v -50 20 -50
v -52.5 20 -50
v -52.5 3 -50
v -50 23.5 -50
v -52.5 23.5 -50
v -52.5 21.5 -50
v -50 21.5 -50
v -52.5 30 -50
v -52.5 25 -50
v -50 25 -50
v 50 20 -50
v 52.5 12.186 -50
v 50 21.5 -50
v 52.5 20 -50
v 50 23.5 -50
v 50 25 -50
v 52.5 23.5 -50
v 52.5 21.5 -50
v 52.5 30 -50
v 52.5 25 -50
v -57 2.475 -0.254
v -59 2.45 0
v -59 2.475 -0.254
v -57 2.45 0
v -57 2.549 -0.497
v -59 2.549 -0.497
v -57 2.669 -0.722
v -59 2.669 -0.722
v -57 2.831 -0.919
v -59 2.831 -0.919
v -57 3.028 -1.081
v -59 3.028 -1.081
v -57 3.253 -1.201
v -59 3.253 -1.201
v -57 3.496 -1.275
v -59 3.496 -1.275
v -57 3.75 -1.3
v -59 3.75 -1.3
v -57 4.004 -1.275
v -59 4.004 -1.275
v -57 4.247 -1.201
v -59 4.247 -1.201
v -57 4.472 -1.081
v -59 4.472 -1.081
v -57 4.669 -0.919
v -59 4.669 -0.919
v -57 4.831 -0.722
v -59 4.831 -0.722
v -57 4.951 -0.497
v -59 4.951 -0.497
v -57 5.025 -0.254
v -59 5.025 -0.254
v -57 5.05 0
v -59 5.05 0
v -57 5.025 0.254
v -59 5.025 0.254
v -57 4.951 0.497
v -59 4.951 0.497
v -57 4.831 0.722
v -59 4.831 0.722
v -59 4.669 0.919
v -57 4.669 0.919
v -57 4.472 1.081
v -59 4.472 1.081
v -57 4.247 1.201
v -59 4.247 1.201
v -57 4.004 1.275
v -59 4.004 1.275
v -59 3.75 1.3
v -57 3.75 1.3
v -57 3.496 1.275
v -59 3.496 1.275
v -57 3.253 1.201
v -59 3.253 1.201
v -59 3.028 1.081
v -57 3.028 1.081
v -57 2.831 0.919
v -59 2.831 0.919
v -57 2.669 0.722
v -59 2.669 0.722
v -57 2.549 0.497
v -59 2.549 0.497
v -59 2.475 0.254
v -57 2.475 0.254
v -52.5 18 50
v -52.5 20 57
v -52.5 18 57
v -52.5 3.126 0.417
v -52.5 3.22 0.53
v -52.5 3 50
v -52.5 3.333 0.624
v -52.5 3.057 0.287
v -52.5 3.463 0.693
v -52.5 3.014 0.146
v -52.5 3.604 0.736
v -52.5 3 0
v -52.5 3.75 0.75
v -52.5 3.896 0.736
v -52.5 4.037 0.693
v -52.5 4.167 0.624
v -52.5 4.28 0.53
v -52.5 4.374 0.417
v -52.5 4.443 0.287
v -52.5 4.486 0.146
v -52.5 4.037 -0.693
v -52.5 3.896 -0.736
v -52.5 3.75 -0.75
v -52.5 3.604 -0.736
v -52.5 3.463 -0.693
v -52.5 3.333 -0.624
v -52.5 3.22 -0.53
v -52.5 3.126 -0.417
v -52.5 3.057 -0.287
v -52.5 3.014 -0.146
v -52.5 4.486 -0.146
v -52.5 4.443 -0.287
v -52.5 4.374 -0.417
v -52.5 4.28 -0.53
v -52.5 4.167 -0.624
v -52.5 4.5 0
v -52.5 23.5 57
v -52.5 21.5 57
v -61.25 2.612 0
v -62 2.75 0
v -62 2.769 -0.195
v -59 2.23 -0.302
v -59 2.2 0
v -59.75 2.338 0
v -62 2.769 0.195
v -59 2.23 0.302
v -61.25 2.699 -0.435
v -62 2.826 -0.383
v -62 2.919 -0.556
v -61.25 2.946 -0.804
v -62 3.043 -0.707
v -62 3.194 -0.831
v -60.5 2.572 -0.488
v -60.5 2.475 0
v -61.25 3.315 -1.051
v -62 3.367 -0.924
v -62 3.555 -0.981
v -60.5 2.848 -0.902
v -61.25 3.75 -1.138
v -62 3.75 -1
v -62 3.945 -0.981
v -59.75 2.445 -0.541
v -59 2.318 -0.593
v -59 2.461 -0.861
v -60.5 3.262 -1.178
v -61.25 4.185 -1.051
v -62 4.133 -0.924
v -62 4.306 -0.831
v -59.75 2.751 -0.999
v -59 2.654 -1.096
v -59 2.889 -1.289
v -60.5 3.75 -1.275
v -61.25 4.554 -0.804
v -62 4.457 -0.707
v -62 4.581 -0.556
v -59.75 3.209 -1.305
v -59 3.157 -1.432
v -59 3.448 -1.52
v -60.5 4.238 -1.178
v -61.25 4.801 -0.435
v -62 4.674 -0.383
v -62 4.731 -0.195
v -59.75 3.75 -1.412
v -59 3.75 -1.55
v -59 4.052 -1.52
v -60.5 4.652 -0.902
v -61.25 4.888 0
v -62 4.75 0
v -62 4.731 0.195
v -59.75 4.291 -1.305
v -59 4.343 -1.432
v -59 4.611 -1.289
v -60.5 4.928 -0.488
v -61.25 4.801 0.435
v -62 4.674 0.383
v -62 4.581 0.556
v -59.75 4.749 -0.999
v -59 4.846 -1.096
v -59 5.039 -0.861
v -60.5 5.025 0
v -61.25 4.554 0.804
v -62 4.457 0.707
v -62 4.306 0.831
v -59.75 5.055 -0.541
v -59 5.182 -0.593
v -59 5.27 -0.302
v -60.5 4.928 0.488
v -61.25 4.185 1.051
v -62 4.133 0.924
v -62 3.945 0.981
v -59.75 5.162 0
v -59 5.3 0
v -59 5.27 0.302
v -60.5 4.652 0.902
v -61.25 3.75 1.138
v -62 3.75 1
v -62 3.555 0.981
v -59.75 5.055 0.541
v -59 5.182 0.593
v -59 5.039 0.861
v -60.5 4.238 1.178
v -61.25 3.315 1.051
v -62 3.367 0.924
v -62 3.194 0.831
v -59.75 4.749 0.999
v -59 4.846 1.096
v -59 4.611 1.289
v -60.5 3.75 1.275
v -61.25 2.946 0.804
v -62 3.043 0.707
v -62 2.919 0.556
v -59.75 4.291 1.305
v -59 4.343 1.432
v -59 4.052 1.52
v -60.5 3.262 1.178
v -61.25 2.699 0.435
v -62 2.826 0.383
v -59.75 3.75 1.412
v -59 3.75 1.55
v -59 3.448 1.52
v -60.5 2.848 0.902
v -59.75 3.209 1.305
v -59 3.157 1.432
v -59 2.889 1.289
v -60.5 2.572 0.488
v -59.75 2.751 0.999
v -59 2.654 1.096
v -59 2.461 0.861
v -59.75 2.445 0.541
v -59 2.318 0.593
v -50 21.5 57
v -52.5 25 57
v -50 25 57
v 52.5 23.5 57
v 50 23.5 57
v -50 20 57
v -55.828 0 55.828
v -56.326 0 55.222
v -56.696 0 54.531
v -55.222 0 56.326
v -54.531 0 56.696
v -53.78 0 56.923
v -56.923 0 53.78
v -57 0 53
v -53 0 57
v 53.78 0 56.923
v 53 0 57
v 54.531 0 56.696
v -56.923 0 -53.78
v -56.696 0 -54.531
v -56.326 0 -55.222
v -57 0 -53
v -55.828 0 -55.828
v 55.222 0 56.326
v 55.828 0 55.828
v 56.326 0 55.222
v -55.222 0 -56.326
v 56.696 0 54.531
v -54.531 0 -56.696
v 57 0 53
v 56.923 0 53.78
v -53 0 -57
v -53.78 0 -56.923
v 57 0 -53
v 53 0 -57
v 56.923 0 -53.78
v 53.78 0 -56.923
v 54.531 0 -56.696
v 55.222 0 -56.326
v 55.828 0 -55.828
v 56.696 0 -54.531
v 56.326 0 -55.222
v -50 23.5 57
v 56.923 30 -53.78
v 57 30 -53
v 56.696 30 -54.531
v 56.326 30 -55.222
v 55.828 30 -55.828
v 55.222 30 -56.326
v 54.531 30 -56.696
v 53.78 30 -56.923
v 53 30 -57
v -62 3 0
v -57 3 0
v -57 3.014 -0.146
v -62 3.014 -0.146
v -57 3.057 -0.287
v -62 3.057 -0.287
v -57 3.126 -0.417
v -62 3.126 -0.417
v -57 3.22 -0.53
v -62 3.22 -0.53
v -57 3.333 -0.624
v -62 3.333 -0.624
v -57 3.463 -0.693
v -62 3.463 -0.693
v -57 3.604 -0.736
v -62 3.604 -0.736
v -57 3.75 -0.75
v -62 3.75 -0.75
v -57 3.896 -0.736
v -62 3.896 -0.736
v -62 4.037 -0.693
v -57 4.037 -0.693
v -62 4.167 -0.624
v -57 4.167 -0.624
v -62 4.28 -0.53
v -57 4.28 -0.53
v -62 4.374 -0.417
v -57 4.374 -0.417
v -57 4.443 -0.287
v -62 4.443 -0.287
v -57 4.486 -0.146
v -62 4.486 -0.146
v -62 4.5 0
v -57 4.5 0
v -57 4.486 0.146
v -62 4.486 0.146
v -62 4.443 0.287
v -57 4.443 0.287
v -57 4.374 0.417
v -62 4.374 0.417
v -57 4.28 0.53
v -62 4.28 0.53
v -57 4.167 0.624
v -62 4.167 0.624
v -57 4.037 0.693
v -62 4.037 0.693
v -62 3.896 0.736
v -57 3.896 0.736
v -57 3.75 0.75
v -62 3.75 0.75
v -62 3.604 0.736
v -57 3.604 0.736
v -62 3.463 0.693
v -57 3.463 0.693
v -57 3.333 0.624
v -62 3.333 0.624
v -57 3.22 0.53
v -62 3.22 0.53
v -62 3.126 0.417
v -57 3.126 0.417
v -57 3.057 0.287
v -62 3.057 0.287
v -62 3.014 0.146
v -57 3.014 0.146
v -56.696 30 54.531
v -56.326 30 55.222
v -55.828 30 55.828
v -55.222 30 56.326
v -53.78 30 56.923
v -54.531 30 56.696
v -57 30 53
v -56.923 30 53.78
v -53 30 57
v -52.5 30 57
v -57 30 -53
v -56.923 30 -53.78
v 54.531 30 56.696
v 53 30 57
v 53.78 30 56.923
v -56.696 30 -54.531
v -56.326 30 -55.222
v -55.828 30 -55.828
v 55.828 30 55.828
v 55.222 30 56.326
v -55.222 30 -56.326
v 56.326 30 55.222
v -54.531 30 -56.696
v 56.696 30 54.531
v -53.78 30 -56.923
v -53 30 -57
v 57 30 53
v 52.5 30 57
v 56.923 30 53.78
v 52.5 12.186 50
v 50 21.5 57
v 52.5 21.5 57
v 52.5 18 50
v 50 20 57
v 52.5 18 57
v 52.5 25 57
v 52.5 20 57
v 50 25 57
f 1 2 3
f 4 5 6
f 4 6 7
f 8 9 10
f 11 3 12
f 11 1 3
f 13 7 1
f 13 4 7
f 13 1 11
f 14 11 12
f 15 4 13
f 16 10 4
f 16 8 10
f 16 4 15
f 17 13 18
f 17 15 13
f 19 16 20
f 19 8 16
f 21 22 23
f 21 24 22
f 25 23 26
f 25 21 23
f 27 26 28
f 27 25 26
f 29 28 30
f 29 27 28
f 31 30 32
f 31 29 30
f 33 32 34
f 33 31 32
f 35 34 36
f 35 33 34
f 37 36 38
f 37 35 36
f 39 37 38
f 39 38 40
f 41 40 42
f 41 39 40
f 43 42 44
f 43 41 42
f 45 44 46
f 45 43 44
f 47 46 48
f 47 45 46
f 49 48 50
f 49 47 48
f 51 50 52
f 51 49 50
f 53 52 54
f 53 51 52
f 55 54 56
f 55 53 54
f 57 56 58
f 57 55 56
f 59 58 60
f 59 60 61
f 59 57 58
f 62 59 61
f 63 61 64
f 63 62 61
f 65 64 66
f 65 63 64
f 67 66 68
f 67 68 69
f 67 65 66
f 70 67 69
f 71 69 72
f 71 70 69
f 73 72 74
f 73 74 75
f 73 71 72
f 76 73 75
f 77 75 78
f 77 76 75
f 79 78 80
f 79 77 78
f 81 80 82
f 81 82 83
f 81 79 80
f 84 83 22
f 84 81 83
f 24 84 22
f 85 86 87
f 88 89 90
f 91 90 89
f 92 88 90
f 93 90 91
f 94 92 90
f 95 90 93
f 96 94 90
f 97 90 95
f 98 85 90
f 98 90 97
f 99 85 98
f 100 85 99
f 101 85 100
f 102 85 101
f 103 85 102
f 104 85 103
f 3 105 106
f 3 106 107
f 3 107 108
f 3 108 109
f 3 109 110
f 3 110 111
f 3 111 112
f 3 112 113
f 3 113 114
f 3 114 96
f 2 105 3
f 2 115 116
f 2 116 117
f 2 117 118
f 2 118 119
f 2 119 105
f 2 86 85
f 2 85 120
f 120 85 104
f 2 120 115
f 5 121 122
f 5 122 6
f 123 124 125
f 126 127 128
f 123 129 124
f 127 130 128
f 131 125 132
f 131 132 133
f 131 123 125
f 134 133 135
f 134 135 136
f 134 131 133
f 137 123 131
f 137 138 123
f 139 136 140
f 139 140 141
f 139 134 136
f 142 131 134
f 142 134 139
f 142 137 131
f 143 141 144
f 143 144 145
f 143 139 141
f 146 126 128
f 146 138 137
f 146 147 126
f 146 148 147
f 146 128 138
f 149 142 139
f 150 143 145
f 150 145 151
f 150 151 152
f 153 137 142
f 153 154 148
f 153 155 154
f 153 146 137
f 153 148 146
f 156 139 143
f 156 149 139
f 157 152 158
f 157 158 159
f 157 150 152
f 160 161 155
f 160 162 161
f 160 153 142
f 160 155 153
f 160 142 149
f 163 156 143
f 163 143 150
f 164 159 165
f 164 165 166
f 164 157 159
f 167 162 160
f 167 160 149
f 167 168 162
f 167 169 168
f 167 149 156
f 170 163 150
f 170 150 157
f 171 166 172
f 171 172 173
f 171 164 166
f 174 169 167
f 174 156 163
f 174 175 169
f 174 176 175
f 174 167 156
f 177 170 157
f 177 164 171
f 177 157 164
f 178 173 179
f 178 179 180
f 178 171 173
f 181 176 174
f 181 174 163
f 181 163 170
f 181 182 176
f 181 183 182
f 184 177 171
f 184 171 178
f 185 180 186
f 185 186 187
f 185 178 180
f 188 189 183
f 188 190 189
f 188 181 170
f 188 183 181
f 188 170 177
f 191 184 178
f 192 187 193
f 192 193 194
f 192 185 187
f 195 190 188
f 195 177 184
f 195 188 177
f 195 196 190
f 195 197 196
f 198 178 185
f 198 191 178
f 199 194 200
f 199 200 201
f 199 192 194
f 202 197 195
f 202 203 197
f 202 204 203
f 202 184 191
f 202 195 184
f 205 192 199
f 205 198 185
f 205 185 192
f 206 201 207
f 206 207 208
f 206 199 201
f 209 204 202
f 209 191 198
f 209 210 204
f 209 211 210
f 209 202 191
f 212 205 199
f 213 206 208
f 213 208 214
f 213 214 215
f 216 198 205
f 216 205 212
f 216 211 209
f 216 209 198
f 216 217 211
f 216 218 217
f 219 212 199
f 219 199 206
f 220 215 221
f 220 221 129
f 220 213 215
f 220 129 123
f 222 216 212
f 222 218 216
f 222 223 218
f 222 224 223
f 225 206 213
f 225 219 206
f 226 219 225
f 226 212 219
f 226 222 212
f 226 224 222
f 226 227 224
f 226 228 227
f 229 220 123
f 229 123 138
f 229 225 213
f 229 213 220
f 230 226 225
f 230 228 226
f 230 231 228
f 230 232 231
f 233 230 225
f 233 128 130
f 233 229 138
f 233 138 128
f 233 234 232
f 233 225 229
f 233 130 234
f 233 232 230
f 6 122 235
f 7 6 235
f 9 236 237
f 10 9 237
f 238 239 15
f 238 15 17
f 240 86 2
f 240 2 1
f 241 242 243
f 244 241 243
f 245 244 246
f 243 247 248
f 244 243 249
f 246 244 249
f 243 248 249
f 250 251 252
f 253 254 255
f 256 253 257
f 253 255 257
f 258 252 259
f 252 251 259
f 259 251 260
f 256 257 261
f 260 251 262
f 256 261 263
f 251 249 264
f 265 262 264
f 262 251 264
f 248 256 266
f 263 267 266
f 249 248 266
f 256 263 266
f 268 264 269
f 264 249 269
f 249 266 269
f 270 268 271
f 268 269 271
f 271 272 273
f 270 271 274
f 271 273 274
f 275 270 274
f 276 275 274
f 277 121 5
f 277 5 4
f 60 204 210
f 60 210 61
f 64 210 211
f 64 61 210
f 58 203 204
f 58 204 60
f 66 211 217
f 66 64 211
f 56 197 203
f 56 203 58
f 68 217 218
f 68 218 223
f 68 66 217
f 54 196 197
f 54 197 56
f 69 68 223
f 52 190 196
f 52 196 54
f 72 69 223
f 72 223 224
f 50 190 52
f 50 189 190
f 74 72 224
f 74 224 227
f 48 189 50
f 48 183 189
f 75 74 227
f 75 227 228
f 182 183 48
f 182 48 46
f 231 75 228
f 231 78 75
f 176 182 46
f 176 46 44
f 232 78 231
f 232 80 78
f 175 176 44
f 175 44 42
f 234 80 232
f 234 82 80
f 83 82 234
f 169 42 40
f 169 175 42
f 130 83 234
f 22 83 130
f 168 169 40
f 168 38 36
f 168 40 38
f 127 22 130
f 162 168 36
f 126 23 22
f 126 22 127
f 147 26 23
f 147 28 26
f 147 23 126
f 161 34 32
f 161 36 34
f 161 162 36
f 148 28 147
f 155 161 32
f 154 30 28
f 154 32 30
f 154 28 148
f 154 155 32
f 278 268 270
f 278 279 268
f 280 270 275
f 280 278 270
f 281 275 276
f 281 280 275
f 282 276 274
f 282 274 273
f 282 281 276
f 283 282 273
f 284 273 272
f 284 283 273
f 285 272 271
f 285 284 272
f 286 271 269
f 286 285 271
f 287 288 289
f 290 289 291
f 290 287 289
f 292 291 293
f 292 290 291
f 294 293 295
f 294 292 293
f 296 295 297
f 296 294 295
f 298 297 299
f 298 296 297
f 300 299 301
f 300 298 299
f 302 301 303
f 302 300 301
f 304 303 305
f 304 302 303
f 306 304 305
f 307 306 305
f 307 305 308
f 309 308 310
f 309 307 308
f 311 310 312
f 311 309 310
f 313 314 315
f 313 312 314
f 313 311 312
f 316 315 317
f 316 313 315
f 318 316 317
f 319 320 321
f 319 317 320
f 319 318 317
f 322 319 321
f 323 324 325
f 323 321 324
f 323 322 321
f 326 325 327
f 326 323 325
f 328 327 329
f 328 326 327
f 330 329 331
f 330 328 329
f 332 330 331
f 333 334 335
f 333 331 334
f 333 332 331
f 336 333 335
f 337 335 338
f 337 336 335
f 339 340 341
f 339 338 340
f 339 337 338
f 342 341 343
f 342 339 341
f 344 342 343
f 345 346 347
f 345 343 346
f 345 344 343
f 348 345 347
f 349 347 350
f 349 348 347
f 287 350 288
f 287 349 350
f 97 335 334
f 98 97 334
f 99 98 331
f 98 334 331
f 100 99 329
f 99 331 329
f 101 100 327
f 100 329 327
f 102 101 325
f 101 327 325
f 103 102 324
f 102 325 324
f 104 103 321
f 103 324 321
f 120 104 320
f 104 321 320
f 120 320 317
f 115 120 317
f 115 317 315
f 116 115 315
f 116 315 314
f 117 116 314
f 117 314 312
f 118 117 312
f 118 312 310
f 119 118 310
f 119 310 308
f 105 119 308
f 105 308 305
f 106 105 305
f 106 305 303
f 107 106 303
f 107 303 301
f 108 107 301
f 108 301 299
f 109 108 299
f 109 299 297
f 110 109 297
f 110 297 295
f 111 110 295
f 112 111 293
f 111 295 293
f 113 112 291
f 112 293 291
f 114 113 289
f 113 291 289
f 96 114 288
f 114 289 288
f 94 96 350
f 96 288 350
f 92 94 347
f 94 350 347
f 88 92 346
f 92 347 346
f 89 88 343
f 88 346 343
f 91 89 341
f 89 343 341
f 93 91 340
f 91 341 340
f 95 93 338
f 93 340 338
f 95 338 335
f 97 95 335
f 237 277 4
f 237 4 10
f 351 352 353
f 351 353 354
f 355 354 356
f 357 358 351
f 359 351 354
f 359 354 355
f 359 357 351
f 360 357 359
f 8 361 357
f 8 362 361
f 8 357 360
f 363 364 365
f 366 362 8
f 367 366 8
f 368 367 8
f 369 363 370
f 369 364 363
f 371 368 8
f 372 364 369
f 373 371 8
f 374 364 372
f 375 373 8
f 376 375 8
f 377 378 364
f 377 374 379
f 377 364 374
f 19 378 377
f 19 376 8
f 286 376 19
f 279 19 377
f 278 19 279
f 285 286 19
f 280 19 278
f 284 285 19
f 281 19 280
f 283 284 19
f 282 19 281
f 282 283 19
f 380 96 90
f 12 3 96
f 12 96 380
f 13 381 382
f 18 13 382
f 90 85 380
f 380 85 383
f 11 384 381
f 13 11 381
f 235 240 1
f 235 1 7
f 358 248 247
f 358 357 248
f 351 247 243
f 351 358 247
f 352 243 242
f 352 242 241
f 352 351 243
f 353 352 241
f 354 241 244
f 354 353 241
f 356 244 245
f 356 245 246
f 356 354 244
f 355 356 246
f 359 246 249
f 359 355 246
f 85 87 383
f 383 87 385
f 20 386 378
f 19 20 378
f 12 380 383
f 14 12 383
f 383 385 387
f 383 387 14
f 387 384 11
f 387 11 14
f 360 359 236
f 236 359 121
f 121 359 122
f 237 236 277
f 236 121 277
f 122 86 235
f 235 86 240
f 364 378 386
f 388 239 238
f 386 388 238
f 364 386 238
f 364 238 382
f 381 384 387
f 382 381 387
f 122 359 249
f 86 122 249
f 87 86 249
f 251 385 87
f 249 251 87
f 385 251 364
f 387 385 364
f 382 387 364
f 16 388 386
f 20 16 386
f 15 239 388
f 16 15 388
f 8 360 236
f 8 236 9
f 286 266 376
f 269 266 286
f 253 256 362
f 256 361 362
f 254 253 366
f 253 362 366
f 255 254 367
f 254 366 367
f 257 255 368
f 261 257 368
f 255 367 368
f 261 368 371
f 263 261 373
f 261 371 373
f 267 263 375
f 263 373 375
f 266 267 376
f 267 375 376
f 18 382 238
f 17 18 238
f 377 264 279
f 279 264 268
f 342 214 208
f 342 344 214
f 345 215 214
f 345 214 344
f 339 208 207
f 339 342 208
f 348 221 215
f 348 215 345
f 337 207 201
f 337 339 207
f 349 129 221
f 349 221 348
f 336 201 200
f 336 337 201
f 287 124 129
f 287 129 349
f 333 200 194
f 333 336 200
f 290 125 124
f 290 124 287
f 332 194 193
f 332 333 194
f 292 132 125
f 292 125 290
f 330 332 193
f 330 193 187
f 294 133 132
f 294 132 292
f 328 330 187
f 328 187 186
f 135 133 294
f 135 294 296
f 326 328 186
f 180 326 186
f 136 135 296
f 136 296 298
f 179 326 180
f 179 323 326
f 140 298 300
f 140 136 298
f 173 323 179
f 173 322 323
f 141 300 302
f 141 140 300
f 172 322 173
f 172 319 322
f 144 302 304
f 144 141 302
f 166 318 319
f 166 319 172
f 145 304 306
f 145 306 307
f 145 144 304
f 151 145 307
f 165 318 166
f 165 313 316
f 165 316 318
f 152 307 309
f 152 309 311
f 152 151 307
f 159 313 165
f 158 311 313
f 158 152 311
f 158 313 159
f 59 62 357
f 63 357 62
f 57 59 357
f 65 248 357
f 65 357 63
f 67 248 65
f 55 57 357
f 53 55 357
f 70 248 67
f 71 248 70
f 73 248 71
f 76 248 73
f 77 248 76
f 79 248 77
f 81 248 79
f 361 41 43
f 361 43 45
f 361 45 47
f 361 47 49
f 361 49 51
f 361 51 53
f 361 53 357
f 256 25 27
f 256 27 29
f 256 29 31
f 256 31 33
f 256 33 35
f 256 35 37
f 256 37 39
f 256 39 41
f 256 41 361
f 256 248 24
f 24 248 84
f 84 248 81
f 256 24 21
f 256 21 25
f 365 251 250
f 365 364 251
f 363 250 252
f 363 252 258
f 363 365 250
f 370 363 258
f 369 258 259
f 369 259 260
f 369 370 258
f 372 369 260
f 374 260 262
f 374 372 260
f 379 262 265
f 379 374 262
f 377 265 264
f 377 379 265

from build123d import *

# Parameters (mm, degrees)
CROQUIS1_W                          = 114
CROQUIS1_H                          = 114
SALIENTE_EXTRUIR1_DEPTH             = 30
REDONDEO1_R                         = 4
CROQUIS2_W                          = 105
CROQUIS2_H                          = 100
CORTAR_EXTRUIR1_DEPTH               = 27
CROQUIS3_W                          = 105
CROQUIS3_H                          = 12
CORTAR_EXTRUIR2_DEPTH               = 7
CROQUIS5_W                          = 2.5
CROQUIS5_H                          = 1.5
SALIENTE_EXTRUIR2_DEPTH             = 107
SALIENTE_EXTRUIR3_REACH             = 59
SALIENTE_EXTRUIR3_DIRECTION_2_REACH = 59
CROQUIS7_R                          = 0.75
CORTAR_EXTRUIR3_DEPTH               = 4.5


with BuildPart() as part:
    # Croquis1 → Saliente-Extruir1 (new body)
    with BuildSketch(Plane(origin=(0, 0, 0), x_dir=(1, 0, 0), z_dir=(0, 1, 0))):
        Rectangle(CROQUIS1_W, CROQUIS1_H)
    extrude(amount=SALIENTE_EXTRUIR1_DEPTH)

    # Redondeo1
    redondeo1_edges = [part.edges().sort_by_distance(p)[0] for p in [
        (57, 15, 57),
        (-57, 15, 57),
        (-57, 15, -57),
        (57, 15, -57),
    ]]
    fillet(redondeo1_edges, radius=REDONDEO1_R)

    # Croquis2 → Cortar-Extruir1 (cut)
    with BuildSketch(Plane(origin=(0, 30, 0), x_dir=(1, 0, 0), z_dir=(0, 1, 0))):
        Rectangle(CROQUIS2_W, CROQUIS2_H)
    extrude(amount=-CORTAR_EXTRUIR1_DEPTH, mode=Mode.SUBTRACT)

    # Croquis3 → Cortar-Extruir2 (cut)
    with BuildSketch(Plane.XY.offset(57)):
        with Locations((0, 24)):
            Rectangle(CROQUIS3_W, CROQUIS3_H)
    extrude(amount=-CORTAR_EXTRUIR2_DEPTH, mode=Mode.SUBTRACT)

    # Croquis5 → Saliente-Extruir2 (add)
    with BuildSketch(Plane.XY.offset(57)):
        with Locations((-51.25, 20.75)):
            Rectangle(CROQUIS5_W, CROQUIS5_H)
        with Locations((-51.25, 24.25)):
            Rectangle(CROQUIS5_W, CROQUIS5_H)
        with Locations((51.25, 20.75)):
            Rectangle(CROQUIS5_W, CROQUIS5_H)
        with Locations((51.25, 24.25)):
            Rectangle(CROQUIS5_W, CROQUIS5_H)
    extrude(amount=-SALIENTE_EXTRUIR2_DEPTH)

    # Saliente-Extruir3: up to this face of the body (flat: up to its plane)
    saliente_extruir3_end = Plane(part.part.faces().sort_by_distance((0, 16.468085106, -50))[0])
    # Croquis6 → Saliente-Extruir3 (add, up to the picked face)
    with BuildSketch(Plane.XY, mode=Mode.PRIVATE) as saliente_extruir3_sk1:
        Polygon((-52.5, 3), (52.5, 12.18630967), (52.5, 3), align=None)
    saliente_extruir3_tool1 = split(extrude(saliente_extruir3_sk1.sketch, amount=-SALIENTE_EXTRUIR3_REACH, mode=Mode.PRIVATE), bisect_by=saliente_extruir3_end, keep=Keep.BOTH, mode=Mode.PRIVATE)
    add(saliente_extruir3_tool1.solids().sort_by_distance((17.5, 6.062103, 0))[0])

    # Saliente-Extruir3 direction 2: up to this face of the body (flat: up to its plane)
    saliente_extruir3_direction_2_end = Plane(part.part.faces().sort_by_distance((0, 10.5, 50))[0])
    # Croquis6 → Saliente-Extruir3 direction 2 (add, up to the picked face)
    with BuildSketch(Plane.XY, mode=Mode.PRIVATE) as saliente_extruir3_direction_2_sk1:
        Polygon((-52.5, 3), (52.5, 12.18630967), (52.5, 3), align=None)
    saliente_extruir3_direction_2_tool1 = split(extrude(saliente_extruir3_direction_2_sk1.sketch, amount=SALIENTE_EXTRUIR3_DIRECTION_2_REACH, mode=Mode.PRIVATE), bisect_by=saliente_extruir3_direction_2_end, keep=Keep.BOTH, mode=Mode.PRIVATE)
    add(saliente_extruir3_direction_2_tool1.solids().sort_by_distance((17.5, 6.062103, 0))[0])

    # Croquis7 → Cortar-Extruir3 (cut)
    with BuildSketch(Plane.ZY.offset(57)):
        with Locations((0, 3.75)):
            Circle(CROQUIS7_R)
    extrude(amount=-CORTAR_EXTRUIR3_DEPTH, mode=Mode.SUBTRACT)

    # Croquis10 → Revolución1 (revolve)
    with BuildSketch(Plane.XY):
        Polygon((-57, 3), (-62, 3), (-62, 2.75), (-59, 2.2), (-59, 2.45), (-57, 2.45), align=None)
    revolve(axis=Axis((-57, 3.75, 0), (1, 0, 0)))


solid = part.part
